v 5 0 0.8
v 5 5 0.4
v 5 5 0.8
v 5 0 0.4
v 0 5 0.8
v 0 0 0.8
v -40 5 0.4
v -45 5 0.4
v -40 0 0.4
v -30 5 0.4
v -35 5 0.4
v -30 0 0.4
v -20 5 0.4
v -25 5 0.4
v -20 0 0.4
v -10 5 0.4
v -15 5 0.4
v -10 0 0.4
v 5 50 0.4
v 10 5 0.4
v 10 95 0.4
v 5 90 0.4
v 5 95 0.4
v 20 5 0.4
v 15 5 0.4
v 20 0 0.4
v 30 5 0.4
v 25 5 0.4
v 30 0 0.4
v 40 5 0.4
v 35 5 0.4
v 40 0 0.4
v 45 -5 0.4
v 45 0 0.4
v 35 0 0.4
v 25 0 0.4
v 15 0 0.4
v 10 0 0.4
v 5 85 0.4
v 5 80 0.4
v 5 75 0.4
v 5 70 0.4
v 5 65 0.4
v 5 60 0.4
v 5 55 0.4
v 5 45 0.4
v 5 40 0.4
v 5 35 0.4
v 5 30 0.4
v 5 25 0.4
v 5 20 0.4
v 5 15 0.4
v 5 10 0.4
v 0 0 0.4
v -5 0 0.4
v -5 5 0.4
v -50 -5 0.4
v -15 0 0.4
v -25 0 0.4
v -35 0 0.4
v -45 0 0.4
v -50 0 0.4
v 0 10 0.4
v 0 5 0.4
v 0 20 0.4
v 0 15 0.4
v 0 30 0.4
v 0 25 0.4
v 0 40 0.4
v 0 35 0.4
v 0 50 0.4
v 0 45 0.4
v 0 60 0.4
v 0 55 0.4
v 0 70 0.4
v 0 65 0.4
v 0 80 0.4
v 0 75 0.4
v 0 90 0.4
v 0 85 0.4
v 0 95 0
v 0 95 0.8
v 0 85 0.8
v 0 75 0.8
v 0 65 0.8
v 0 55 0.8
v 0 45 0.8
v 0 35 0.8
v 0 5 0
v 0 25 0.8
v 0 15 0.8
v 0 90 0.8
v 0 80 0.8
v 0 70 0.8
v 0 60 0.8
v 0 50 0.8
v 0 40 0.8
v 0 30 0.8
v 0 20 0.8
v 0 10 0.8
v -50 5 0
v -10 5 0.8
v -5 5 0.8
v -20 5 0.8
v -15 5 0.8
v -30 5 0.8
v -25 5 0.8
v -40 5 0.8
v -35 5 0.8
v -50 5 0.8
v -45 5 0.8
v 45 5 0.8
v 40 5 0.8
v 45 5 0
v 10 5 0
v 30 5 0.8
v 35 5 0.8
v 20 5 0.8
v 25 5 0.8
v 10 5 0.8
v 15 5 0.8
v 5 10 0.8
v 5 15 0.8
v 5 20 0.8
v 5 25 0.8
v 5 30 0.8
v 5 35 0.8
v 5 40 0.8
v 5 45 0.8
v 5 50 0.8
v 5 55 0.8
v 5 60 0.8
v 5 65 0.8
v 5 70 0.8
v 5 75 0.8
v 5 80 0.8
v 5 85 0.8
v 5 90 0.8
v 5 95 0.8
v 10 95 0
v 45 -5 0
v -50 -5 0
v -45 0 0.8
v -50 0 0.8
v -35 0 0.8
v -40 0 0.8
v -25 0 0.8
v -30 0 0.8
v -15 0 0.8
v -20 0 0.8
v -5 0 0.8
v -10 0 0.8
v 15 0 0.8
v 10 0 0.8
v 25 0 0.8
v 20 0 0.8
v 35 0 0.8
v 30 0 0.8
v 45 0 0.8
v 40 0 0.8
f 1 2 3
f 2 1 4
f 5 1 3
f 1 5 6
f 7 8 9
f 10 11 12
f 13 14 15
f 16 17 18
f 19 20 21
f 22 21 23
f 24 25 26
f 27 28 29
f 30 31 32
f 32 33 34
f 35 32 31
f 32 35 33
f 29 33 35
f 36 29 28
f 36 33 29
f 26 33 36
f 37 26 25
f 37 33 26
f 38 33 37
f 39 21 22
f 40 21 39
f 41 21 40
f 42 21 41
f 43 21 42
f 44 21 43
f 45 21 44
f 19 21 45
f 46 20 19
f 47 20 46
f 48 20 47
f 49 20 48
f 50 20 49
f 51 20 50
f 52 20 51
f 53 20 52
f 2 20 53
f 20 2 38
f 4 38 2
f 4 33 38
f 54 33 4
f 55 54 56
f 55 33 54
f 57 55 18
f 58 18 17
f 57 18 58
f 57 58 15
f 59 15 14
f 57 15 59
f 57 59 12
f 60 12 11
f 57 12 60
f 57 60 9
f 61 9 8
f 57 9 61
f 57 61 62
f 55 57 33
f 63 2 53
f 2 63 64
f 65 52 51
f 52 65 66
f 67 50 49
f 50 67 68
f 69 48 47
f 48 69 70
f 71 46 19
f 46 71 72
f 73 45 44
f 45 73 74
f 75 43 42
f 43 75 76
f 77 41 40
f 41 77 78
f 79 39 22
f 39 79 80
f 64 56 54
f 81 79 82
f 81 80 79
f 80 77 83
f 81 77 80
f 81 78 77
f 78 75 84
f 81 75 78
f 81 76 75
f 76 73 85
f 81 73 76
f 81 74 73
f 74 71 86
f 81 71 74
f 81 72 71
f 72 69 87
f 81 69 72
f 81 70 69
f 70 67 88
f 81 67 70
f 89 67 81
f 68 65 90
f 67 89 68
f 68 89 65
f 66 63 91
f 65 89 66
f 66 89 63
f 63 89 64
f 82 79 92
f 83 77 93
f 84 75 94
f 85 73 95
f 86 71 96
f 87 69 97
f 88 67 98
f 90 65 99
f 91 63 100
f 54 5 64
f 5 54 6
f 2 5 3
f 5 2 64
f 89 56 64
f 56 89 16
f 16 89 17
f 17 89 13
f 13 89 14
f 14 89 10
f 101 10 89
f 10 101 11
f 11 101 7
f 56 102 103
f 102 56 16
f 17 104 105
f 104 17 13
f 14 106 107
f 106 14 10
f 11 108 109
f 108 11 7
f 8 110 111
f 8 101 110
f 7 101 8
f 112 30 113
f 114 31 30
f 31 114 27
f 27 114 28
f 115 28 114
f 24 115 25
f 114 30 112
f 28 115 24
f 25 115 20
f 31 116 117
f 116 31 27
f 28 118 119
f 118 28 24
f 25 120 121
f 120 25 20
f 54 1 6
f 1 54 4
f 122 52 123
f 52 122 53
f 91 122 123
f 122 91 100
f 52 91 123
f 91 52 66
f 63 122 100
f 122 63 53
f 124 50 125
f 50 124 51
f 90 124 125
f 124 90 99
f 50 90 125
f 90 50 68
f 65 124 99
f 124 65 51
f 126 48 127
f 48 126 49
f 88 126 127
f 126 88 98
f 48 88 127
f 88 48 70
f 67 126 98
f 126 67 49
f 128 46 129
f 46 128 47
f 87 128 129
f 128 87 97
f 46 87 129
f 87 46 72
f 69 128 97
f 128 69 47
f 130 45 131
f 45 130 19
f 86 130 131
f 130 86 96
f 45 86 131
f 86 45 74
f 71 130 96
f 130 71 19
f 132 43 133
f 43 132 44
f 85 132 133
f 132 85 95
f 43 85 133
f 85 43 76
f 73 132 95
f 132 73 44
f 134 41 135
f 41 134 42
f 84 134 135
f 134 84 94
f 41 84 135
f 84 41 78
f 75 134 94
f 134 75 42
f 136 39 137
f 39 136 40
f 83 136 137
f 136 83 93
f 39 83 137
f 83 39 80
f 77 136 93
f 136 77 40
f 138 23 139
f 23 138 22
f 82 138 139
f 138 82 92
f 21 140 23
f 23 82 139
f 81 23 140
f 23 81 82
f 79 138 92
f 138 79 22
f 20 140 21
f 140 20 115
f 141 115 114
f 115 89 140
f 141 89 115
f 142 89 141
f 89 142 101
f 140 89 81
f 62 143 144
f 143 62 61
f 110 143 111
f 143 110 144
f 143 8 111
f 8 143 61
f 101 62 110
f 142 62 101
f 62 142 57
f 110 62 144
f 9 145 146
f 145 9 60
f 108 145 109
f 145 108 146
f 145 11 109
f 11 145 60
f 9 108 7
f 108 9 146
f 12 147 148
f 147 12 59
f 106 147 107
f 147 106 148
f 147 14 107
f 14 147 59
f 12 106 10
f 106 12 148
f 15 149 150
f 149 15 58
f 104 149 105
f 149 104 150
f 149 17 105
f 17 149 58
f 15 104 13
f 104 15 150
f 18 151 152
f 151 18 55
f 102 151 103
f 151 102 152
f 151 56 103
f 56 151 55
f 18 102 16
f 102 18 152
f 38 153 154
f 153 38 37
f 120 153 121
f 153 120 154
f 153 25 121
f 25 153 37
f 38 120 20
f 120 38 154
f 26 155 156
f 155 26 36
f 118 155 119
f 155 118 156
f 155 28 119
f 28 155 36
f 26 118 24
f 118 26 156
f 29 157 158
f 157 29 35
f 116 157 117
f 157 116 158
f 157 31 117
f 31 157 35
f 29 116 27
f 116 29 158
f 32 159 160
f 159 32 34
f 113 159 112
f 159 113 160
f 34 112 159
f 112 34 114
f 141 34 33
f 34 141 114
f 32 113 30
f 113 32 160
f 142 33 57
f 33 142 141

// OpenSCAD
layerHeight = 0.4;
size = 10;
offset = 0.1; //["0.2", "0.1", "0.05"]
draw = "extruder1"; //["extruder1", "extruder2"]

if (draw=="extruder1") {
    union() {
        cube([10,(size)*10-5,layerHeight]);
        for (i=[0:size-1]) {
            translate([0,i*10,layerHeight])
            cube([5,5,layerHeight]);
        }
    }
    translate([-(((size)/2)*10),5,0])
    rotate([0,0,-90])
    union() {
        cube([10,(size)*10-5,layerHeight]);
        for (i=[0:size-1]) {
            translate([0,i*10,layerHeight])
            cube([5,5,layerHeight]);
        }
    }
} else {
    union() {
        for (i=[0:size-1]) {
            translate([5,i*10-(i-size/2)*offset,layerHeight])
            cube([5,5,layerHeight]);
        }
    }
    translate([-((size/2)*10),5,0])
    rotate([0,0,-90])
    union() {
        for (i=[0:size-1]) {
            translate([5,i*10-(i-size/2)*offset,layerHeight])
            cube([5,5,layerHeight]);
        }
    }
    
}
